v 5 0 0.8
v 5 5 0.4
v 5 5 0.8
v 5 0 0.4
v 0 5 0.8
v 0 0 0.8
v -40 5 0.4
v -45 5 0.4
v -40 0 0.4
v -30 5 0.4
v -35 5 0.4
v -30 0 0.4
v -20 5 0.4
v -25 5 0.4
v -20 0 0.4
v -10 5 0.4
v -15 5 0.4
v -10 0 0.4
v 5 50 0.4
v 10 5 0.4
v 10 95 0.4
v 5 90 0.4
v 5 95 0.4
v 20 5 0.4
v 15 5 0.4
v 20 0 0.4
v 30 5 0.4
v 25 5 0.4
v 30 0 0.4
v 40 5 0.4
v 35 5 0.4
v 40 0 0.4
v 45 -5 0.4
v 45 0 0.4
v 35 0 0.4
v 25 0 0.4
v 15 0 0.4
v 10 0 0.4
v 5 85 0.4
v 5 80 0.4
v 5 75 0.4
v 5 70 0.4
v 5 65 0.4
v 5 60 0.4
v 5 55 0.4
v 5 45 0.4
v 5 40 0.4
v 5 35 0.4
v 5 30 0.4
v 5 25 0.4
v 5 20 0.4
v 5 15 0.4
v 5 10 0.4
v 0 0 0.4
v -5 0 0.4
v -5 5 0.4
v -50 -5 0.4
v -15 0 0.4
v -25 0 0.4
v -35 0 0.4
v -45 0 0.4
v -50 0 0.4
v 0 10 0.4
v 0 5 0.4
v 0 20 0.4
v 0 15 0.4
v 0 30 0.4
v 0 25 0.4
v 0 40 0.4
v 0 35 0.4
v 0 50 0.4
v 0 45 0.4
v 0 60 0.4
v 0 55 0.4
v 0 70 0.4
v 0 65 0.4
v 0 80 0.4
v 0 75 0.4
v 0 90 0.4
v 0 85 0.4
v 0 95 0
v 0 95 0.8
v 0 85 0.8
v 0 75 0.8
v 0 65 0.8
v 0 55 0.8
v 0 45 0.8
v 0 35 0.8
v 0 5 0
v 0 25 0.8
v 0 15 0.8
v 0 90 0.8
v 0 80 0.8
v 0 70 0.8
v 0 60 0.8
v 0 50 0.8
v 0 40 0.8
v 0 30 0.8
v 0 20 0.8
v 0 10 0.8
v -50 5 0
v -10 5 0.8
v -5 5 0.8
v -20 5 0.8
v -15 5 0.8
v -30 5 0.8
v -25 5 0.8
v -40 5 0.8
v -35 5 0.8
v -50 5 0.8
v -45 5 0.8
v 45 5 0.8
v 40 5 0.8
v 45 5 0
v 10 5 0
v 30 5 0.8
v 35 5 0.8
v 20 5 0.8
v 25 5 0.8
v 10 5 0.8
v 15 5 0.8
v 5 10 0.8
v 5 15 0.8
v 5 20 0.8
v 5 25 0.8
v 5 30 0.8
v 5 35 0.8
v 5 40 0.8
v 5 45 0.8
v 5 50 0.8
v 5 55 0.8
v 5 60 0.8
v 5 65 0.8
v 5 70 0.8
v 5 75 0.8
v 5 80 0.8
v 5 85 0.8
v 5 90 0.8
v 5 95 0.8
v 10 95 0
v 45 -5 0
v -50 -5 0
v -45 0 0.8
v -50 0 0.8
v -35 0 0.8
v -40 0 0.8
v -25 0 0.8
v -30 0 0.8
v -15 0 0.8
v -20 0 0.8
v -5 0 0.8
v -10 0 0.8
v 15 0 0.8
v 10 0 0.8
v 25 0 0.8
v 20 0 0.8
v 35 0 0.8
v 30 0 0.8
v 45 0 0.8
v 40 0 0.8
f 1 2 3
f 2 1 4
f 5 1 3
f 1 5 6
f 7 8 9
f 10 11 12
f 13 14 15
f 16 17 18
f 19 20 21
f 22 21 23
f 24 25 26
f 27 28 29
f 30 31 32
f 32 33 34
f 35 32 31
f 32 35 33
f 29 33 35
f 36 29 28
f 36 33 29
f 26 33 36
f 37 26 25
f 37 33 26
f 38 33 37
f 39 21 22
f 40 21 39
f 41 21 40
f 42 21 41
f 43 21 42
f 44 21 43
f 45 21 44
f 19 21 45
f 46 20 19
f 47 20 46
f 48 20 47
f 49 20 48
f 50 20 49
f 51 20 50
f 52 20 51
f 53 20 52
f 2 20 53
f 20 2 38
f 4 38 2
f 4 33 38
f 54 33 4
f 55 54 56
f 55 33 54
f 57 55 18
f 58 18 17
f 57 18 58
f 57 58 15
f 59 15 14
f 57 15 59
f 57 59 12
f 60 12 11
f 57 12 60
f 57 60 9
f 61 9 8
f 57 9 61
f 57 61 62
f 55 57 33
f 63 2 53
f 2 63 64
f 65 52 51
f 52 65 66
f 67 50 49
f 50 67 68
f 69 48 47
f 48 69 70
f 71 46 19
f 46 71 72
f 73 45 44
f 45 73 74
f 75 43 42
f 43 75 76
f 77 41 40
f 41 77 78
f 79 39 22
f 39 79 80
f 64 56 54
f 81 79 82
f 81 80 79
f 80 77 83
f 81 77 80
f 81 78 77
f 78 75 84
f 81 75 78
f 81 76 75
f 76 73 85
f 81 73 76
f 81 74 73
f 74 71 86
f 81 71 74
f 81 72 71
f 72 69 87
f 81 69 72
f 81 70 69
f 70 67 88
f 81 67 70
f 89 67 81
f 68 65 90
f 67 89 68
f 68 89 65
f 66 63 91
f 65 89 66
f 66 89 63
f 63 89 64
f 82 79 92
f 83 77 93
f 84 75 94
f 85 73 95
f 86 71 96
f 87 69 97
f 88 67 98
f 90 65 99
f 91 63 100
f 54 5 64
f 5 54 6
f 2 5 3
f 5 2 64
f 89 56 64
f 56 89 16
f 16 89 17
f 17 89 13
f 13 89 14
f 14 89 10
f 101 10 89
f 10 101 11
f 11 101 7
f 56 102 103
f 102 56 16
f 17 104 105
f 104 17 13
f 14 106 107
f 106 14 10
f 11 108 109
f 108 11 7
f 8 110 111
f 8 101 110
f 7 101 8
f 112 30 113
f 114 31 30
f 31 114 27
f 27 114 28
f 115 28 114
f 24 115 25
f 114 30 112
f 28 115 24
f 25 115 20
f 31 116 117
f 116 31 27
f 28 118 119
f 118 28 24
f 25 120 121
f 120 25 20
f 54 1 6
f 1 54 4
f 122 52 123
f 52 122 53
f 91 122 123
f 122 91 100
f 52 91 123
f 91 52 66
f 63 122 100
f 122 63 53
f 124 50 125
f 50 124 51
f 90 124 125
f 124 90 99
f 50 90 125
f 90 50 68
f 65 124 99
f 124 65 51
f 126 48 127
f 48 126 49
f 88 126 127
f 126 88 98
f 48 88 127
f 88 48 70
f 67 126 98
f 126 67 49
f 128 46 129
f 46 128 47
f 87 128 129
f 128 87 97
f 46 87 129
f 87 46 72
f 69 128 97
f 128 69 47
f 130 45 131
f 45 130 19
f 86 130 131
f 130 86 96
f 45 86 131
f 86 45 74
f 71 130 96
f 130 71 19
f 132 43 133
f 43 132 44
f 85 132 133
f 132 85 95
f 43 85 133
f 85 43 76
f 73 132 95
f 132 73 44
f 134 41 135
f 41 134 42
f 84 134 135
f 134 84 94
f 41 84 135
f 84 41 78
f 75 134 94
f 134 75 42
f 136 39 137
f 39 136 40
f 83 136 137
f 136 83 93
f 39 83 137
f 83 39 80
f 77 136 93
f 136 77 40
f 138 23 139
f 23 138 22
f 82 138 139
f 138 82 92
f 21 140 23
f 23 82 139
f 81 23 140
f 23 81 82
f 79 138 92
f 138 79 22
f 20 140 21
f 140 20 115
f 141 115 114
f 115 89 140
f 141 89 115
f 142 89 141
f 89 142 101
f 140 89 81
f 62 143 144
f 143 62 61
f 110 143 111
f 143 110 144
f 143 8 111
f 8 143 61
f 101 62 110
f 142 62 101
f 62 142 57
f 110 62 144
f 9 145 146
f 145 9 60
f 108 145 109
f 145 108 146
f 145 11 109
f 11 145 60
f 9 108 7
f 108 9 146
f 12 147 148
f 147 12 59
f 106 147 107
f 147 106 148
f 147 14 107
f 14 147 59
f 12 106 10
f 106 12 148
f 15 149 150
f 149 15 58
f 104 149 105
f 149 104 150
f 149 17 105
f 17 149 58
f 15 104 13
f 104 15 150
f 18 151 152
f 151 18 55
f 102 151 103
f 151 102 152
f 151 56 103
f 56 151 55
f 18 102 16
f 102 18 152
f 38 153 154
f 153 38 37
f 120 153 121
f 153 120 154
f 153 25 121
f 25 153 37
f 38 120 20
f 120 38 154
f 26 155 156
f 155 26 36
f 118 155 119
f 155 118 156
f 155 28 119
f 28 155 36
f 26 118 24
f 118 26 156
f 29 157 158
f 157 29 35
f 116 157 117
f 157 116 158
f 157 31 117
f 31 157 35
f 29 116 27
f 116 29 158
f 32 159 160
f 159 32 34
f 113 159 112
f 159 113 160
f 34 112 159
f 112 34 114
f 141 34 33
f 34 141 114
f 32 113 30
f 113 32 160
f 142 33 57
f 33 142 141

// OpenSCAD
layerHeight = 0.4;
size = 10;
offset = 0.1; //["0.2", "0.1", "0.05"]
draw = "extruder1"; //["extruder1", "extruder2"]

if (draw=="extruder1") {
    union() {
        cube([10,(size)*10-5,layerHeight]);
        for (i=[0:size-1]) {
            translate([0,i*10,layerHeight])
            cube([5,5,layerHeight]);
        }
    }
    translate([-(((size)/2)*10),5,0])
    rotate([0,0,-90])
    union() {
        cube([10,(size)*10-5,layerHeight]);
        for (i=[0:size-1]) {
            translate([0,i*10,layerHeight])
            cube([5,5,layerHeight]);
        }
    }
} else {
    union() {
        for (i=[0:size-1]) {
            translate([5,i*10-(i-size/2)*offset,layerHeight])
            cube([5,5,layerHeight]);
        }
    }
    translate([-((size/2)*10),5,0])
    rotate([0,0,-90])
    union() {
        for (i=[0:size-1]) {
            translate([5,i*10-(i-size/2)*offset,layerHeight])
            cube([5,5,layerHeight]);
        }
    }
    
}
